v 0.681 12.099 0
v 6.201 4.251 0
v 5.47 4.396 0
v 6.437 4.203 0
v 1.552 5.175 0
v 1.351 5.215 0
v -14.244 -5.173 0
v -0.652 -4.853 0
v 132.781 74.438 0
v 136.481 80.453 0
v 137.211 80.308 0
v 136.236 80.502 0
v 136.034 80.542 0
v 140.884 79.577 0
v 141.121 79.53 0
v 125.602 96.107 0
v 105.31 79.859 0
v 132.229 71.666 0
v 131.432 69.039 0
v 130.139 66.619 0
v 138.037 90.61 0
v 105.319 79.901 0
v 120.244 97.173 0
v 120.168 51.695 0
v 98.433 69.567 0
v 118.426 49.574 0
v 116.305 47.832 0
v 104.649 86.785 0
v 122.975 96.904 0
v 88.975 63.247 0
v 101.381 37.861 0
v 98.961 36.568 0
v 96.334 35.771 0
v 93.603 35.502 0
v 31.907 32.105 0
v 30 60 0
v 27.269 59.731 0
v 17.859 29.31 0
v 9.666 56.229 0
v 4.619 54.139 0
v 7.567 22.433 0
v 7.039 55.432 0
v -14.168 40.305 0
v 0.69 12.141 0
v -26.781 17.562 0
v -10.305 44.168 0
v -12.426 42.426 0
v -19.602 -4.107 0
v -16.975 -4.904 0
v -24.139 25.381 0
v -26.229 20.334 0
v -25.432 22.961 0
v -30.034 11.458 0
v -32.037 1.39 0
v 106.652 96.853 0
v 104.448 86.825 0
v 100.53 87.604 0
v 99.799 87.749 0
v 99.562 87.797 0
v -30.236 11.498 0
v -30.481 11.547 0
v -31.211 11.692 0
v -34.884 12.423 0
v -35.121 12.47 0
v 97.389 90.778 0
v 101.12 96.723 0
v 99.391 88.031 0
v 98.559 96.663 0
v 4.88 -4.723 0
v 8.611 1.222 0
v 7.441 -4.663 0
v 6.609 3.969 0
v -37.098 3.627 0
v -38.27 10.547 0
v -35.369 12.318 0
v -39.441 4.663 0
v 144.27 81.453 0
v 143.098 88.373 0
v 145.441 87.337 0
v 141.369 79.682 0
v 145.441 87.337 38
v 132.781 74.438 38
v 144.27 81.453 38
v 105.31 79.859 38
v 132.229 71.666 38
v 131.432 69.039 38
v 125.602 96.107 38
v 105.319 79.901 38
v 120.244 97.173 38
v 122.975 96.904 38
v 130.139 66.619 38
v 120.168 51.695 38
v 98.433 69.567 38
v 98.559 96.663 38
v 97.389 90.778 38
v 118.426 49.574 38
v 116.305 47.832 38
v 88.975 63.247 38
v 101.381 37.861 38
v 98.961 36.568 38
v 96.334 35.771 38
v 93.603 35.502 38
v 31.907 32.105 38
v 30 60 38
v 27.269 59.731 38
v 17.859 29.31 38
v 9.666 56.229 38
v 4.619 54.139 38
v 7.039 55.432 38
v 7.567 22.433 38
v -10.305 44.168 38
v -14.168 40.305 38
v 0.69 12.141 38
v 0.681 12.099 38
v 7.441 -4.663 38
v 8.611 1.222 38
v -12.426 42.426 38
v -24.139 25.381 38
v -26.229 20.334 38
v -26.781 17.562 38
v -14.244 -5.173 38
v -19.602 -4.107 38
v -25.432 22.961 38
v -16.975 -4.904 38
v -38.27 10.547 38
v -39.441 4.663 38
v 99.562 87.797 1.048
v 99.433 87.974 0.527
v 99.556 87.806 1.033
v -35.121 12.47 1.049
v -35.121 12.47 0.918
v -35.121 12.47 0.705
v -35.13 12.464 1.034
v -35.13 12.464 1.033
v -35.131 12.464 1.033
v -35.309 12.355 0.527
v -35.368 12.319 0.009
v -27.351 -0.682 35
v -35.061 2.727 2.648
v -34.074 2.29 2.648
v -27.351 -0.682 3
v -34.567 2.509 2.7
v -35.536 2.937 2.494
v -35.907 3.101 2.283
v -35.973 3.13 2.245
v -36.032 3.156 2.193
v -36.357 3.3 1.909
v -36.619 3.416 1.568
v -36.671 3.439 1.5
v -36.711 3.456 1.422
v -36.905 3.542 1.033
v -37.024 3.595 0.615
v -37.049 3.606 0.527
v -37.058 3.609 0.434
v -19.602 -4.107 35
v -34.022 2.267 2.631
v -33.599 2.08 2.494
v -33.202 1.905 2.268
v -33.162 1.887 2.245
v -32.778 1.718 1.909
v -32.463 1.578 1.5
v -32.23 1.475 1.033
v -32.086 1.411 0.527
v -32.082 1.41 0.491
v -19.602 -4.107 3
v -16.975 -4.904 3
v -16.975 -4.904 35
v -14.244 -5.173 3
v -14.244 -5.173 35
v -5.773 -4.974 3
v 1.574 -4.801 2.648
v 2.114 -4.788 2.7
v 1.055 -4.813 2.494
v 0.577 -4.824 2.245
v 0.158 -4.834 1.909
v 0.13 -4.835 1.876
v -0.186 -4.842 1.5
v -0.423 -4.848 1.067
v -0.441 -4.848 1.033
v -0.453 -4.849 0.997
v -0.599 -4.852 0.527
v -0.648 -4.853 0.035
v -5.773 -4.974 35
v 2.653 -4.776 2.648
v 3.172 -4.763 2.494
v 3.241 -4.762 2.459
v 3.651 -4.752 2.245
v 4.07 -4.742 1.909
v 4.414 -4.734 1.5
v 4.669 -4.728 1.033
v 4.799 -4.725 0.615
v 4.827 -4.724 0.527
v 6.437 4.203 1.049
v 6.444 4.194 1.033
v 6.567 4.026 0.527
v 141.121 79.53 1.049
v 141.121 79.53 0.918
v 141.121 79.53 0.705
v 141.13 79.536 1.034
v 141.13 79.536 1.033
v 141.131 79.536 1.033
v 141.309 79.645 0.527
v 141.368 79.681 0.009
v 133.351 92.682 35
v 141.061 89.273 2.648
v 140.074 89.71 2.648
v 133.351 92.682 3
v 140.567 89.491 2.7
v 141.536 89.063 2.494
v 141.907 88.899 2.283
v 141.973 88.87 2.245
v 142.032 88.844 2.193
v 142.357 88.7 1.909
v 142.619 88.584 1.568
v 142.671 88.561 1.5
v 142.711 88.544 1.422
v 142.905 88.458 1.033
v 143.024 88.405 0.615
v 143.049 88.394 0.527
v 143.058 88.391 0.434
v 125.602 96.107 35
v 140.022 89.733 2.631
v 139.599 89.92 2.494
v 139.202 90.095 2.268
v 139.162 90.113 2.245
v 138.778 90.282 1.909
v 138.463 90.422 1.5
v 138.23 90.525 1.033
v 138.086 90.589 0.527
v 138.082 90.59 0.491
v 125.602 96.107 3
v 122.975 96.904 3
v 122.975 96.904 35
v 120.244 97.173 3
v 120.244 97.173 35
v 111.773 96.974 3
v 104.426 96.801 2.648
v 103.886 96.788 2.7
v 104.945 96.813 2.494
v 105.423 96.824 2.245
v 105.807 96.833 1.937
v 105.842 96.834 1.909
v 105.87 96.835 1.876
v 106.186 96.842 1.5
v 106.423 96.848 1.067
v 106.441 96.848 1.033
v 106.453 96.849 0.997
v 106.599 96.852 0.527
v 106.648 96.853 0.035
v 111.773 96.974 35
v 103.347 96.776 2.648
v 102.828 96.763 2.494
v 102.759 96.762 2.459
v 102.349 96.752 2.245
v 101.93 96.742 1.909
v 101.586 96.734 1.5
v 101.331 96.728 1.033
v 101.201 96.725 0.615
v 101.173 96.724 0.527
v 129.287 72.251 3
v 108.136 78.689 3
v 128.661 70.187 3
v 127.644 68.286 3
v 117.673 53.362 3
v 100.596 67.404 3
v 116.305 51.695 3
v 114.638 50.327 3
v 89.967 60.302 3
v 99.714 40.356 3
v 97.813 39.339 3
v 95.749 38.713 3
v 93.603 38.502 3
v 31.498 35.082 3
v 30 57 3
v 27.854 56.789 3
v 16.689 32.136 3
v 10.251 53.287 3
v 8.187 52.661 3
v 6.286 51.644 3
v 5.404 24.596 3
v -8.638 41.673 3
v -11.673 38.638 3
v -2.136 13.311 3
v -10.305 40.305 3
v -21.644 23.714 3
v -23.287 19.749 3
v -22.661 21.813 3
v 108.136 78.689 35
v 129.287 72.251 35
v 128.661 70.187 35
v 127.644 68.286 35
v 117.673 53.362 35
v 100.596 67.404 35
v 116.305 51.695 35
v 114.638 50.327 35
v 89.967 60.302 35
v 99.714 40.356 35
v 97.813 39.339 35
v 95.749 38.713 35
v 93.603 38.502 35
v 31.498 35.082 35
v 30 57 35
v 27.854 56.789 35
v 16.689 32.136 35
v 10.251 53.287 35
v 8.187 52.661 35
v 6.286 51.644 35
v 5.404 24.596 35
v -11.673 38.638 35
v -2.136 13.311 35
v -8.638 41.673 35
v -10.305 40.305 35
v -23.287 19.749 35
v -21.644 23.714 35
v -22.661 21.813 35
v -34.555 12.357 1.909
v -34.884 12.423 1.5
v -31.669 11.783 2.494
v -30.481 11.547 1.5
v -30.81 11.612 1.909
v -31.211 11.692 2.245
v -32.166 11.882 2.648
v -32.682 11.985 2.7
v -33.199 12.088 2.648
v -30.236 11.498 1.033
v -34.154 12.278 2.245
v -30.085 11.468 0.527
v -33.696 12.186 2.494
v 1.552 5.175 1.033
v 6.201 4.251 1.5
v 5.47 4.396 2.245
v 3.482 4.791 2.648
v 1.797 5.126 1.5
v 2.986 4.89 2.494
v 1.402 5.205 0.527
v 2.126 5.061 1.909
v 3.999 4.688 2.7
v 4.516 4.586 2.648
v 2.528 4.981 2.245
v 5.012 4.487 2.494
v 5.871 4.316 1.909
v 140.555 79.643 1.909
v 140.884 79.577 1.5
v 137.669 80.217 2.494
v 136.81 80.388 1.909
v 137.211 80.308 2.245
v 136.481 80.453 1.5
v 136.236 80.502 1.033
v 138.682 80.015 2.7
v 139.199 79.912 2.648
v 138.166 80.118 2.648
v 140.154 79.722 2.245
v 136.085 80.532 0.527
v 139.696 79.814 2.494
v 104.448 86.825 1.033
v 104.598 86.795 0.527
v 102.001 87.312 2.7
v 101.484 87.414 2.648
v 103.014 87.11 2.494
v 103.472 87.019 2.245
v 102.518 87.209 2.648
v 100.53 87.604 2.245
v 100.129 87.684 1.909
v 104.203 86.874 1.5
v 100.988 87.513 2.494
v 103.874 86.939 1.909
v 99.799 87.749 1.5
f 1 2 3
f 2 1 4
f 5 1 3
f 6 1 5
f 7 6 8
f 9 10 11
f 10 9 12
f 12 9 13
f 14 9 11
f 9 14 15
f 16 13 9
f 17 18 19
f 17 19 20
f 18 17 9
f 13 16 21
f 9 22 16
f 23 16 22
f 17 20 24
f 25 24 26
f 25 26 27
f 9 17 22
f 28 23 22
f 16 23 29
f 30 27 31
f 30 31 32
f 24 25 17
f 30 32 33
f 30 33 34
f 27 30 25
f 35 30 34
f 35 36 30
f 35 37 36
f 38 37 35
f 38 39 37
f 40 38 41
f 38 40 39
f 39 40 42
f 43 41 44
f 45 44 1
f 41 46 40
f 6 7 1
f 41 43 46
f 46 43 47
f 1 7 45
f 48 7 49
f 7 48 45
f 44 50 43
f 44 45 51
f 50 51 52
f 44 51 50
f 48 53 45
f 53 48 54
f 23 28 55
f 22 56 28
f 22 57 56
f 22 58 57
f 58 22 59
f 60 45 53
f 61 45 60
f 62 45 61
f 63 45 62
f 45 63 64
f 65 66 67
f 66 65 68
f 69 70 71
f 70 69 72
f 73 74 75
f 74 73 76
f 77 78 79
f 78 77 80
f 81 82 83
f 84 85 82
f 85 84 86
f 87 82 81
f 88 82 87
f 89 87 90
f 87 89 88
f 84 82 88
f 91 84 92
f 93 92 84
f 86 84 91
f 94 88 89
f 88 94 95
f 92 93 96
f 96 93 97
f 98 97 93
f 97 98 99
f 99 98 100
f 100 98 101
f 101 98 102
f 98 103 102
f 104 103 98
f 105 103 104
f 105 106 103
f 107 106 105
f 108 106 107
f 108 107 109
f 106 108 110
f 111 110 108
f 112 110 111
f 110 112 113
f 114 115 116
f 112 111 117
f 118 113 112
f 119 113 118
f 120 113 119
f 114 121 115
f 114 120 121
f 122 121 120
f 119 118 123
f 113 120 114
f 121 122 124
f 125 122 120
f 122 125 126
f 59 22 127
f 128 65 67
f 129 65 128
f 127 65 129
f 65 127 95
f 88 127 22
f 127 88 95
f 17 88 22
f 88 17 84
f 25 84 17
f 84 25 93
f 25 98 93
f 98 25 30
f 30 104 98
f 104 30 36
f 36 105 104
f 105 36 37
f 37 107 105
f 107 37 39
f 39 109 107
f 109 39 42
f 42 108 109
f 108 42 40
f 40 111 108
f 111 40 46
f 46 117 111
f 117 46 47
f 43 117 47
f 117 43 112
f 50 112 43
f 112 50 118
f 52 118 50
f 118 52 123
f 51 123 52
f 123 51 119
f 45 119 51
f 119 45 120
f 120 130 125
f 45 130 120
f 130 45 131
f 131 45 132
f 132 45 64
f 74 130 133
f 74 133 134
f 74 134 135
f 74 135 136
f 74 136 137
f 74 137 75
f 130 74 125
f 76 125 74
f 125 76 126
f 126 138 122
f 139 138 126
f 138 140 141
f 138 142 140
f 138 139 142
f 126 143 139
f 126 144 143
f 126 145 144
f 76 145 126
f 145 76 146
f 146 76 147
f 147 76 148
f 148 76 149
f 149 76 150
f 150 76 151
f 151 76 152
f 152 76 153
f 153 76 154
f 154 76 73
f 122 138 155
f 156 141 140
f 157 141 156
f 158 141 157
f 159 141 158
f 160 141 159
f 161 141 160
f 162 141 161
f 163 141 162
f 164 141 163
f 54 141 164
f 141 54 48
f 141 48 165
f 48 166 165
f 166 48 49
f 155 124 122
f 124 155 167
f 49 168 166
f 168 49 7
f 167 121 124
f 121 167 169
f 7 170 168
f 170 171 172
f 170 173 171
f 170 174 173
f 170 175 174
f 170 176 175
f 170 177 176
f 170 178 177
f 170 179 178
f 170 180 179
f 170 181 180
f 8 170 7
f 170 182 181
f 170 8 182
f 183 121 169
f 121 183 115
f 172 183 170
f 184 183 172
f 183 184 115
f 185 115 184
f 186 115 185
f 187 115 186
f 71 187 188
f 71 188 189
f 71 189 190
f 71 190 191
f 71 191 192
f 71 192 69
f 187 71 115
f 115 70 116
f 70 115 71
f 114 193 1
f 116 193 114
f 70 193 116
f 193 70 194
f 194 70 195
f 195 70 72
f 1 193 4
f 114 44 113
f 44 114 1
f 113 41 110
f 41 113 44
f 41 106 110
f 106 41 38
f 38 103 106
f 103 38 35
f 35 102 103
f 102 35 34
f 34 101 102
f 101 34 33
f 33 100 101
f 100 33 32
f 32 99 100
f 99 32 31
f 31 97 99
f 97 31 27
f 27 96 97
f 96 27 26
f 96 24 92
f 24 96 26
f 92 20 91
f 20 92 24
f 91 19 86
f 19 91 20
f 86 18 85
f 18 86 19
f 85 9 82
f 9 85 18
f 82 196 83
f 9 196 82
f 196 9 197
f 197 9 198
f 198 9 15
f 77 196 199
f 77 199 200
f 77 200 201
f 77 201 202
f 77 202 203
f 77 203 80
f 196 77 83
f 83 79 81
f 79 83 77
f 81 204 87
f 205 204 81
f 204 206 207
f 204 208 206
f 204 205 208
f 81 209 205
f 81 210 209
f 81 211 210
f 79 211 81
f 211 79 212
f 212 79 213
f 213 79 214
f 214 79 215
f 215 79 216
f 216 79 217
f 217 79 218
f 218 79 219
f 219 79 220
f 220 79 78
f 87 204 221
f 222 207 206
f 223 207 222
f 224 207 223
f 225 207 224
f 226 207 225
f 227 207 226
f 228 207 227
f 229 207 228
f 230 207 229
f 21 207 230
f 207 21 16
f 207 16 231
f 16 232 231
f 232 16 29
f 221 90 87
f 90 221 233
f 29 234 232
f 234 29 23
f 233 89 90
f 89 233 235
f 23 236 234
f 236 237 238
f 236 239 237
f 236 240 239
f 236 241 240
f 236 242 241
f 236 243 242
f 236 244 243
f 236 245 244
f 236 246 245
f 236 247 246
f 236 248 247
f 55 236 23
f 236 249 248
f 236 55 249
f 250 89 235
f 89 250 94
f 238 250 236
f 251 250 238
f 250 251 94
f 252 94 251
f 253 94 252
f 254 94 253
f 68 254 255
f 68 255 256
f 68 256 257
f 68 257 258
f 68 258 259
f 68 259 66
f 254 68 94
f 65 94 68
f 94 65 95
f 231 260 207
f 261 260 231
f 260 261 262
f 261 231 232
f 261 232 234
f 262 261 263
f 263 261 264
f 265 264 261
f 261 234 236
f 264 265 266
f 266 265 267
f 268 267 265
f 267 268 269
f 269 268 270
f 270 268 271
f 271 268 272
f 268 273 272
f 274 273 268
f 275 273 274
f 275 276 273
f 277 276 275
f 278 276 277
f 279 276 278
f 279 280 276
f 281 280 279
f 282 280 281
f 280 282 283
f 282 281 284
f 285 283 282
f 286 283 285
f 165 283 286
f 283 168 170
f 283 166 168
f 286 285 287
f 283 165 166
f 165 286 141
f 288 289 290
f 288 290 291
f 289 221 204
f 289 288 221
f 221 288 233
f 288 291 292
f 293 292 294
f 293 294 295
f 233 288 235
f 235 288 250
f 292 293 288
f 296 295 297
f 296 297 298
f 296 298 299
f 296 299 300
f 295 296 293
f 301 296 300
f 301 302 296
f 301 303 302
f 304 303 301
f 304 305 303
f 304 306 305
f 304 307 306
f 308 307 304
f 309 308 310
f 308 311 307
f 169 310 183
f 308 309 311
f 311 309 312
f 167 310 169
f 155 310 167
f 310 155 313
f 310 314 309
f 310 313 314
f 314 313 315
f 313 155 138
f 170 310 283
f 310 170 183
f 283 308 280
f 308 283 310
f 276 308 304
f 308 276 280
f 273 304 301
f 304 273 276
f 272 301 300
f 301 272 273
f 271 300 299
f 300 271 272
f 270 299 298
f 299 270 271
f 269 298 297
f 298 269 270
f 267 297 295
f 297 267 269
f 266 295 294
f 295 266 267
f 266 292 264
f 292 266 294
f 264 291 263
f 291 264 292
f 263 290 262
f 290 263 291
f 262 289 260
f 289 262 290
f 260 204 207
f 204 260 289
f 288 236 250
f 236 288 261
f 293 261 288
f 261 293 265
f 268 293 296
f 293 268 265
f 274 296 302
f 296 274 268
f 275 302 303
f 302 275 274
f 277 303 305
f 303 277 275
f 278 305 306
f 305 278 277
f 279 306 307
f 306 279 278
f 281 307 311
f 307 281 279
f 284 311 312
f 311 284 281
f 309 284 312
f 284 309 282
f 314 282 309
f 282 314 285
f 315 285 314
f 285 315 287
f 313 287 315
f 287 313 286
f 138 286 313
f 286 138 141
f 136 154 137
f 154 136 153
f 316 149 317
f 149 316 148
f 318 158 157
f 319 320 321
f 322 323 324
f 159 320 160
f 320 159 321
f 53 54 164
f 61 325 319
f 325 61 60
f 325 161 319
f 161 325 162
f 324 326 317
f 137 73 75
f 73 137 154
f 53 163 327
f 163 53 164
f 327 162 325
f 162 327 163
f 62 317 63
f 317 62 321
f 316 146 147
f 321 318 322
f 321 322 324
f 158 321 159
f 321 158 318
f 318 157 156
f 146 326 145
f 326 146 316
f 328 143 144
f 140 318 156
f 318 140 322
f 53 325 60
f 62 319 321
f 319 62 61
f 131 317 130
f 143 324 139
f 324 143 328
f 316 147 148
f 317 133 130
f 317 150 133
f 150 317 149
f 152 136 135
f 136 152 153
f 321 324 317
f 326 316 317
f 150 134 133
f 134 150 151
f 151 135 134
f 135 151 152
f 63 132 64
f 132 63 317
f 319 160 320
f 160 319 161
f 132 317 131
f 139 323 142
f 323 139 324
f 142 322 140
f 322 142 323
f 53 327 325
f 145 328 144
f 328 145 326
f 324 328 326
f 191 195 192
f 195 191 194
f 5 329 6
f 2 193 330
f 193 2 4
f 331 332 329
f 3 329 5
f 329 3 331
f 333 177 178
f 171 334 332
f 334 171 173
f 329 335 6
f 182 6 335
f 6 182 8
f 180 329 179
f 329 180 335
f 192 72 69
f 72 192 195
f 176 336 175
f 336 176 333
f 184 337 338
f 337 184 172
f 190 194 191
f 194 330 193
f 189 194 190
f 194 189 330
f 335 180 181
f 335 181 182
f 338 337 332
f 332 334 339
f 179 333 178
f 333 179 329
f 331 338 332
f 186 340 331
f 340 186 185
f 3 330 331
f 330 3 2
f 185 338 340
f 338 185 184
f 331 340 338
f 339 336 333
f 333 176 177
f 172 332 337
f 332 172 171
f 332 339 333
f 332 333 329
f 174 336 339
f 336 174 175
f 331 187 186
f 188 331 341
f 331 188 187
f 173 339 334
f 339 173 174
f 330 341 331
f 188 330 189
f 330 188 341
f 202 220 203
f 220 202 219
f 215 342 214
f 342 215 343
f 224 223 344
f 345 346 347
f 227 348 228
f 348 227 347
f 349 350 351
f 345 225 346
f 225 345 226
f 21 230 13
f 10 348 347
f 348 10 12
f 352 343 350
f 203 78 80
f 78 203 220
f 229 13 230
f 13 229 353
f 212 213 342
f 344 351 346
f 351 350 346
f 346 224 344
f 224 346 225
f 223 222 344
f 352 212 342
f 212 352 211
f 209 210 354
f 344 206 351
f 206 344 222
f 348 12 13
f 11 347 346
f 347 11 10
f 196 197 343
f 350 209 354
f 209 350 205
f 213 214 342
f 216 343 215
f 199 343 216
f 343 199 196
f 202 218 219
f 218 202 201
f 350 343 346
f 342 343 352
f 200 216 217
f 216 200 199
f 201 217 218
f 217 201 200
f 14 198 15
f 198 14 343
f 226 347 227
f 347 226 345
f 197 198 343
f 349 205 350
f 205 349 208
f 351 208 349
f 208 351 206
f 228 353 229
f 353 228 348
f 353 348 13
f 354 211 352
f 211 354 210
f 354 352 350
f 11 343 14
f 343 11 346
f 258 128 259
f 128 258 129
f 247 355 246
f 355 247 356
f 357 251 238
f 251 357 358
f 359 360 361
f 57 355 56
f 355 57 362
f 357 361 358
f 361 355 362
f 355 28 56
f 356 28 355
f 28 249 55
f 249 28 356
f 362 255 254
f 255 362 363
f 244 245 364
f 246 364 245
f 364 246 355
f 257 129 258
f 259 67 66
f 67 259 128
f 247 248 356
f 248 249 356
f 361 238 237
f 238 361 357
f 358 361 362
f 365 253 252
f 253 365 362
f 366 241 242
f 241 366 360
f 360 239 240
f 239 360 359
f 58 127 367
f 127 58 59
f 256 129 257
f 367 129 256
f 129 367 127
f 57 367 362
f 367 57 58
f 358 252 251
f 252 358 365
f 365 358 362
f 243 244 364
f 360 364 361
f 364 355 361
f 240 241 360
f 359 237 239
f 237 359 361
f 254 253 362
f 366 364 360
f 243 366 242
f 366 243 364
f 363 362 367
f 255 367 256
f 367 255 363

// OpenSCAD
$fn = 32;

// ----------------------------------------------------------------------
// Air duct: 28 mm duct, 3 mm wall, 38 mm across
// ----------------------------------------------------------------------

// --- parameters (mm) ---
duct_r = 14;              // duct core radius
duct_d = 28;              // duct core diameter
wall = 3;                 // duct wall thickness
height = 38;              // duct width (extrusion height)
port_r = 23.9;            // port flange half width
port_d = 47.8;            // port flange width
port_t = 6;               // port flange thickness
bolt_d = 5.4;             // port bolt holes
bolt_offset = 18.7;       // bolt hole offset from the port axis

difference() {
  /* outer hull chain: tube with a flat flange plate at every port */
  linear_extrude(height = 38) {
    hull() {
      polygon([[7.441, -4.663], [-39.441, 4.663], [-38.27, 10.547], [8.611, 1.222]]);
      translate([-14.244, 8.827]) circle(r = 14);
    }
    hull() {
      translate([-14.244, 8.827]) circle(r = 14);
      translate([-12.498, 17.603]) circle(r = 14);
    }
    hull() {
      translate([-12.498, 17.603]) circle(r = 14);
      translate([-2.527, 32.527]) circle(r = 14);
    }
    hull() {
      translate([-2.527, 32.527]) circle(r = 14);
      translate([12.397, 42.498]) circle(r = 14);
    }
    hull() {
      translate([12.397, 42.498]) circle(r = 14);
      translate([30, 46]) circle(r = 14);
    }
    hull() {
      translate([30, 46]) circle(r = 14);
      translate([93.603, 49.502]) circle(r = 14);
    }
    hull() {
      translate([93.603, 49.502]) circle(r = 14);
      translate([108.527, 59.473]) circle(r = 14);
    }
    hull() {
      translate([108.527, 59.473]) circle(r = 14);
      translate([118.498, 74.397]) circle(r = 14);
    }
    hull() {
      translate([118.498, 74.397]) circle(r = 14);
      translate([120.244, 83.173]) circle(r = 14);
    }
    hull() {
      translate([120.244, 83.173]) circle(r = 14);
      polygon([[98.559, 96.663], [145.441, 87.337], [144.27, 81.453], [97.389, 90.778]]);
    }
  }
  /* air passage: the same chain inset by the wall, 5 mm proud of the ports */
  translate([0, 0, 3]) linear_extrude(height = 32) {
    hull() {
      translate([-16.975, -4.904]) circle(r = 11);
      translate([-12.498, 17.603]) circle(r = 11);
    }
    hull() {
      translate([-12.498, 17.603]) circle(r = 11);
      translate([-2.527, 32.527]) circle(r = 11);
    }
    hull() {
      translate([-2.527, 32.527]) circle(r = 11);
      translate([12.397, 42.498]) circle(r = 11);
    }
    hull() {
      translate([12.397, 42.498]) circle(r = 11);
      translate([30, 46]) circle(r = 11);
    }
    hull() {
      translate([30, 46]) circle(r = 11);
      translate([93.603, 49.502]) circle(r = 11);
    }
    hull() {
      translate([93.603, 49.502]) circle(r = 11);
      translate([108.527, 59.473]) circle(r = 11);
    }
    hull() {
      translate([108.527, 59.473]) circle(r = 11);
      translate([118.498, 74.397]) circle(r = 11);
    }
    hull() {
      translate([118.498, 74.397]) circle(r = 11);
      translate([122.975, 96.904]) circle(r = 11);
    }
  }
  translate([-16, 0]) rotate([0, 0, -11.25]) translate([-18.7, -2.5]) rotate([-90, 0, 0]) cylinder(h = 11, d = 5.4);
  translate([-16, 0]) rotate([0, 0, -11.25]) translate([18.7, -2.5]) rotate([-90, 0, 0]) cylinder(h = 11, d = 5.4);
  translate([122, 92]) rotate([0, 0, 168.75]) translate([-18.7, -2.5]) rotate([-90, 0, 0]) cylinder(h = 11, d = 5.4);
  translate([122, 92]) rotate([0, 0, 168.75]) translate([18.7, -2.5]) rotate([-90, 0, 0]) cylinder(h = 11, d = 5.4);
}
